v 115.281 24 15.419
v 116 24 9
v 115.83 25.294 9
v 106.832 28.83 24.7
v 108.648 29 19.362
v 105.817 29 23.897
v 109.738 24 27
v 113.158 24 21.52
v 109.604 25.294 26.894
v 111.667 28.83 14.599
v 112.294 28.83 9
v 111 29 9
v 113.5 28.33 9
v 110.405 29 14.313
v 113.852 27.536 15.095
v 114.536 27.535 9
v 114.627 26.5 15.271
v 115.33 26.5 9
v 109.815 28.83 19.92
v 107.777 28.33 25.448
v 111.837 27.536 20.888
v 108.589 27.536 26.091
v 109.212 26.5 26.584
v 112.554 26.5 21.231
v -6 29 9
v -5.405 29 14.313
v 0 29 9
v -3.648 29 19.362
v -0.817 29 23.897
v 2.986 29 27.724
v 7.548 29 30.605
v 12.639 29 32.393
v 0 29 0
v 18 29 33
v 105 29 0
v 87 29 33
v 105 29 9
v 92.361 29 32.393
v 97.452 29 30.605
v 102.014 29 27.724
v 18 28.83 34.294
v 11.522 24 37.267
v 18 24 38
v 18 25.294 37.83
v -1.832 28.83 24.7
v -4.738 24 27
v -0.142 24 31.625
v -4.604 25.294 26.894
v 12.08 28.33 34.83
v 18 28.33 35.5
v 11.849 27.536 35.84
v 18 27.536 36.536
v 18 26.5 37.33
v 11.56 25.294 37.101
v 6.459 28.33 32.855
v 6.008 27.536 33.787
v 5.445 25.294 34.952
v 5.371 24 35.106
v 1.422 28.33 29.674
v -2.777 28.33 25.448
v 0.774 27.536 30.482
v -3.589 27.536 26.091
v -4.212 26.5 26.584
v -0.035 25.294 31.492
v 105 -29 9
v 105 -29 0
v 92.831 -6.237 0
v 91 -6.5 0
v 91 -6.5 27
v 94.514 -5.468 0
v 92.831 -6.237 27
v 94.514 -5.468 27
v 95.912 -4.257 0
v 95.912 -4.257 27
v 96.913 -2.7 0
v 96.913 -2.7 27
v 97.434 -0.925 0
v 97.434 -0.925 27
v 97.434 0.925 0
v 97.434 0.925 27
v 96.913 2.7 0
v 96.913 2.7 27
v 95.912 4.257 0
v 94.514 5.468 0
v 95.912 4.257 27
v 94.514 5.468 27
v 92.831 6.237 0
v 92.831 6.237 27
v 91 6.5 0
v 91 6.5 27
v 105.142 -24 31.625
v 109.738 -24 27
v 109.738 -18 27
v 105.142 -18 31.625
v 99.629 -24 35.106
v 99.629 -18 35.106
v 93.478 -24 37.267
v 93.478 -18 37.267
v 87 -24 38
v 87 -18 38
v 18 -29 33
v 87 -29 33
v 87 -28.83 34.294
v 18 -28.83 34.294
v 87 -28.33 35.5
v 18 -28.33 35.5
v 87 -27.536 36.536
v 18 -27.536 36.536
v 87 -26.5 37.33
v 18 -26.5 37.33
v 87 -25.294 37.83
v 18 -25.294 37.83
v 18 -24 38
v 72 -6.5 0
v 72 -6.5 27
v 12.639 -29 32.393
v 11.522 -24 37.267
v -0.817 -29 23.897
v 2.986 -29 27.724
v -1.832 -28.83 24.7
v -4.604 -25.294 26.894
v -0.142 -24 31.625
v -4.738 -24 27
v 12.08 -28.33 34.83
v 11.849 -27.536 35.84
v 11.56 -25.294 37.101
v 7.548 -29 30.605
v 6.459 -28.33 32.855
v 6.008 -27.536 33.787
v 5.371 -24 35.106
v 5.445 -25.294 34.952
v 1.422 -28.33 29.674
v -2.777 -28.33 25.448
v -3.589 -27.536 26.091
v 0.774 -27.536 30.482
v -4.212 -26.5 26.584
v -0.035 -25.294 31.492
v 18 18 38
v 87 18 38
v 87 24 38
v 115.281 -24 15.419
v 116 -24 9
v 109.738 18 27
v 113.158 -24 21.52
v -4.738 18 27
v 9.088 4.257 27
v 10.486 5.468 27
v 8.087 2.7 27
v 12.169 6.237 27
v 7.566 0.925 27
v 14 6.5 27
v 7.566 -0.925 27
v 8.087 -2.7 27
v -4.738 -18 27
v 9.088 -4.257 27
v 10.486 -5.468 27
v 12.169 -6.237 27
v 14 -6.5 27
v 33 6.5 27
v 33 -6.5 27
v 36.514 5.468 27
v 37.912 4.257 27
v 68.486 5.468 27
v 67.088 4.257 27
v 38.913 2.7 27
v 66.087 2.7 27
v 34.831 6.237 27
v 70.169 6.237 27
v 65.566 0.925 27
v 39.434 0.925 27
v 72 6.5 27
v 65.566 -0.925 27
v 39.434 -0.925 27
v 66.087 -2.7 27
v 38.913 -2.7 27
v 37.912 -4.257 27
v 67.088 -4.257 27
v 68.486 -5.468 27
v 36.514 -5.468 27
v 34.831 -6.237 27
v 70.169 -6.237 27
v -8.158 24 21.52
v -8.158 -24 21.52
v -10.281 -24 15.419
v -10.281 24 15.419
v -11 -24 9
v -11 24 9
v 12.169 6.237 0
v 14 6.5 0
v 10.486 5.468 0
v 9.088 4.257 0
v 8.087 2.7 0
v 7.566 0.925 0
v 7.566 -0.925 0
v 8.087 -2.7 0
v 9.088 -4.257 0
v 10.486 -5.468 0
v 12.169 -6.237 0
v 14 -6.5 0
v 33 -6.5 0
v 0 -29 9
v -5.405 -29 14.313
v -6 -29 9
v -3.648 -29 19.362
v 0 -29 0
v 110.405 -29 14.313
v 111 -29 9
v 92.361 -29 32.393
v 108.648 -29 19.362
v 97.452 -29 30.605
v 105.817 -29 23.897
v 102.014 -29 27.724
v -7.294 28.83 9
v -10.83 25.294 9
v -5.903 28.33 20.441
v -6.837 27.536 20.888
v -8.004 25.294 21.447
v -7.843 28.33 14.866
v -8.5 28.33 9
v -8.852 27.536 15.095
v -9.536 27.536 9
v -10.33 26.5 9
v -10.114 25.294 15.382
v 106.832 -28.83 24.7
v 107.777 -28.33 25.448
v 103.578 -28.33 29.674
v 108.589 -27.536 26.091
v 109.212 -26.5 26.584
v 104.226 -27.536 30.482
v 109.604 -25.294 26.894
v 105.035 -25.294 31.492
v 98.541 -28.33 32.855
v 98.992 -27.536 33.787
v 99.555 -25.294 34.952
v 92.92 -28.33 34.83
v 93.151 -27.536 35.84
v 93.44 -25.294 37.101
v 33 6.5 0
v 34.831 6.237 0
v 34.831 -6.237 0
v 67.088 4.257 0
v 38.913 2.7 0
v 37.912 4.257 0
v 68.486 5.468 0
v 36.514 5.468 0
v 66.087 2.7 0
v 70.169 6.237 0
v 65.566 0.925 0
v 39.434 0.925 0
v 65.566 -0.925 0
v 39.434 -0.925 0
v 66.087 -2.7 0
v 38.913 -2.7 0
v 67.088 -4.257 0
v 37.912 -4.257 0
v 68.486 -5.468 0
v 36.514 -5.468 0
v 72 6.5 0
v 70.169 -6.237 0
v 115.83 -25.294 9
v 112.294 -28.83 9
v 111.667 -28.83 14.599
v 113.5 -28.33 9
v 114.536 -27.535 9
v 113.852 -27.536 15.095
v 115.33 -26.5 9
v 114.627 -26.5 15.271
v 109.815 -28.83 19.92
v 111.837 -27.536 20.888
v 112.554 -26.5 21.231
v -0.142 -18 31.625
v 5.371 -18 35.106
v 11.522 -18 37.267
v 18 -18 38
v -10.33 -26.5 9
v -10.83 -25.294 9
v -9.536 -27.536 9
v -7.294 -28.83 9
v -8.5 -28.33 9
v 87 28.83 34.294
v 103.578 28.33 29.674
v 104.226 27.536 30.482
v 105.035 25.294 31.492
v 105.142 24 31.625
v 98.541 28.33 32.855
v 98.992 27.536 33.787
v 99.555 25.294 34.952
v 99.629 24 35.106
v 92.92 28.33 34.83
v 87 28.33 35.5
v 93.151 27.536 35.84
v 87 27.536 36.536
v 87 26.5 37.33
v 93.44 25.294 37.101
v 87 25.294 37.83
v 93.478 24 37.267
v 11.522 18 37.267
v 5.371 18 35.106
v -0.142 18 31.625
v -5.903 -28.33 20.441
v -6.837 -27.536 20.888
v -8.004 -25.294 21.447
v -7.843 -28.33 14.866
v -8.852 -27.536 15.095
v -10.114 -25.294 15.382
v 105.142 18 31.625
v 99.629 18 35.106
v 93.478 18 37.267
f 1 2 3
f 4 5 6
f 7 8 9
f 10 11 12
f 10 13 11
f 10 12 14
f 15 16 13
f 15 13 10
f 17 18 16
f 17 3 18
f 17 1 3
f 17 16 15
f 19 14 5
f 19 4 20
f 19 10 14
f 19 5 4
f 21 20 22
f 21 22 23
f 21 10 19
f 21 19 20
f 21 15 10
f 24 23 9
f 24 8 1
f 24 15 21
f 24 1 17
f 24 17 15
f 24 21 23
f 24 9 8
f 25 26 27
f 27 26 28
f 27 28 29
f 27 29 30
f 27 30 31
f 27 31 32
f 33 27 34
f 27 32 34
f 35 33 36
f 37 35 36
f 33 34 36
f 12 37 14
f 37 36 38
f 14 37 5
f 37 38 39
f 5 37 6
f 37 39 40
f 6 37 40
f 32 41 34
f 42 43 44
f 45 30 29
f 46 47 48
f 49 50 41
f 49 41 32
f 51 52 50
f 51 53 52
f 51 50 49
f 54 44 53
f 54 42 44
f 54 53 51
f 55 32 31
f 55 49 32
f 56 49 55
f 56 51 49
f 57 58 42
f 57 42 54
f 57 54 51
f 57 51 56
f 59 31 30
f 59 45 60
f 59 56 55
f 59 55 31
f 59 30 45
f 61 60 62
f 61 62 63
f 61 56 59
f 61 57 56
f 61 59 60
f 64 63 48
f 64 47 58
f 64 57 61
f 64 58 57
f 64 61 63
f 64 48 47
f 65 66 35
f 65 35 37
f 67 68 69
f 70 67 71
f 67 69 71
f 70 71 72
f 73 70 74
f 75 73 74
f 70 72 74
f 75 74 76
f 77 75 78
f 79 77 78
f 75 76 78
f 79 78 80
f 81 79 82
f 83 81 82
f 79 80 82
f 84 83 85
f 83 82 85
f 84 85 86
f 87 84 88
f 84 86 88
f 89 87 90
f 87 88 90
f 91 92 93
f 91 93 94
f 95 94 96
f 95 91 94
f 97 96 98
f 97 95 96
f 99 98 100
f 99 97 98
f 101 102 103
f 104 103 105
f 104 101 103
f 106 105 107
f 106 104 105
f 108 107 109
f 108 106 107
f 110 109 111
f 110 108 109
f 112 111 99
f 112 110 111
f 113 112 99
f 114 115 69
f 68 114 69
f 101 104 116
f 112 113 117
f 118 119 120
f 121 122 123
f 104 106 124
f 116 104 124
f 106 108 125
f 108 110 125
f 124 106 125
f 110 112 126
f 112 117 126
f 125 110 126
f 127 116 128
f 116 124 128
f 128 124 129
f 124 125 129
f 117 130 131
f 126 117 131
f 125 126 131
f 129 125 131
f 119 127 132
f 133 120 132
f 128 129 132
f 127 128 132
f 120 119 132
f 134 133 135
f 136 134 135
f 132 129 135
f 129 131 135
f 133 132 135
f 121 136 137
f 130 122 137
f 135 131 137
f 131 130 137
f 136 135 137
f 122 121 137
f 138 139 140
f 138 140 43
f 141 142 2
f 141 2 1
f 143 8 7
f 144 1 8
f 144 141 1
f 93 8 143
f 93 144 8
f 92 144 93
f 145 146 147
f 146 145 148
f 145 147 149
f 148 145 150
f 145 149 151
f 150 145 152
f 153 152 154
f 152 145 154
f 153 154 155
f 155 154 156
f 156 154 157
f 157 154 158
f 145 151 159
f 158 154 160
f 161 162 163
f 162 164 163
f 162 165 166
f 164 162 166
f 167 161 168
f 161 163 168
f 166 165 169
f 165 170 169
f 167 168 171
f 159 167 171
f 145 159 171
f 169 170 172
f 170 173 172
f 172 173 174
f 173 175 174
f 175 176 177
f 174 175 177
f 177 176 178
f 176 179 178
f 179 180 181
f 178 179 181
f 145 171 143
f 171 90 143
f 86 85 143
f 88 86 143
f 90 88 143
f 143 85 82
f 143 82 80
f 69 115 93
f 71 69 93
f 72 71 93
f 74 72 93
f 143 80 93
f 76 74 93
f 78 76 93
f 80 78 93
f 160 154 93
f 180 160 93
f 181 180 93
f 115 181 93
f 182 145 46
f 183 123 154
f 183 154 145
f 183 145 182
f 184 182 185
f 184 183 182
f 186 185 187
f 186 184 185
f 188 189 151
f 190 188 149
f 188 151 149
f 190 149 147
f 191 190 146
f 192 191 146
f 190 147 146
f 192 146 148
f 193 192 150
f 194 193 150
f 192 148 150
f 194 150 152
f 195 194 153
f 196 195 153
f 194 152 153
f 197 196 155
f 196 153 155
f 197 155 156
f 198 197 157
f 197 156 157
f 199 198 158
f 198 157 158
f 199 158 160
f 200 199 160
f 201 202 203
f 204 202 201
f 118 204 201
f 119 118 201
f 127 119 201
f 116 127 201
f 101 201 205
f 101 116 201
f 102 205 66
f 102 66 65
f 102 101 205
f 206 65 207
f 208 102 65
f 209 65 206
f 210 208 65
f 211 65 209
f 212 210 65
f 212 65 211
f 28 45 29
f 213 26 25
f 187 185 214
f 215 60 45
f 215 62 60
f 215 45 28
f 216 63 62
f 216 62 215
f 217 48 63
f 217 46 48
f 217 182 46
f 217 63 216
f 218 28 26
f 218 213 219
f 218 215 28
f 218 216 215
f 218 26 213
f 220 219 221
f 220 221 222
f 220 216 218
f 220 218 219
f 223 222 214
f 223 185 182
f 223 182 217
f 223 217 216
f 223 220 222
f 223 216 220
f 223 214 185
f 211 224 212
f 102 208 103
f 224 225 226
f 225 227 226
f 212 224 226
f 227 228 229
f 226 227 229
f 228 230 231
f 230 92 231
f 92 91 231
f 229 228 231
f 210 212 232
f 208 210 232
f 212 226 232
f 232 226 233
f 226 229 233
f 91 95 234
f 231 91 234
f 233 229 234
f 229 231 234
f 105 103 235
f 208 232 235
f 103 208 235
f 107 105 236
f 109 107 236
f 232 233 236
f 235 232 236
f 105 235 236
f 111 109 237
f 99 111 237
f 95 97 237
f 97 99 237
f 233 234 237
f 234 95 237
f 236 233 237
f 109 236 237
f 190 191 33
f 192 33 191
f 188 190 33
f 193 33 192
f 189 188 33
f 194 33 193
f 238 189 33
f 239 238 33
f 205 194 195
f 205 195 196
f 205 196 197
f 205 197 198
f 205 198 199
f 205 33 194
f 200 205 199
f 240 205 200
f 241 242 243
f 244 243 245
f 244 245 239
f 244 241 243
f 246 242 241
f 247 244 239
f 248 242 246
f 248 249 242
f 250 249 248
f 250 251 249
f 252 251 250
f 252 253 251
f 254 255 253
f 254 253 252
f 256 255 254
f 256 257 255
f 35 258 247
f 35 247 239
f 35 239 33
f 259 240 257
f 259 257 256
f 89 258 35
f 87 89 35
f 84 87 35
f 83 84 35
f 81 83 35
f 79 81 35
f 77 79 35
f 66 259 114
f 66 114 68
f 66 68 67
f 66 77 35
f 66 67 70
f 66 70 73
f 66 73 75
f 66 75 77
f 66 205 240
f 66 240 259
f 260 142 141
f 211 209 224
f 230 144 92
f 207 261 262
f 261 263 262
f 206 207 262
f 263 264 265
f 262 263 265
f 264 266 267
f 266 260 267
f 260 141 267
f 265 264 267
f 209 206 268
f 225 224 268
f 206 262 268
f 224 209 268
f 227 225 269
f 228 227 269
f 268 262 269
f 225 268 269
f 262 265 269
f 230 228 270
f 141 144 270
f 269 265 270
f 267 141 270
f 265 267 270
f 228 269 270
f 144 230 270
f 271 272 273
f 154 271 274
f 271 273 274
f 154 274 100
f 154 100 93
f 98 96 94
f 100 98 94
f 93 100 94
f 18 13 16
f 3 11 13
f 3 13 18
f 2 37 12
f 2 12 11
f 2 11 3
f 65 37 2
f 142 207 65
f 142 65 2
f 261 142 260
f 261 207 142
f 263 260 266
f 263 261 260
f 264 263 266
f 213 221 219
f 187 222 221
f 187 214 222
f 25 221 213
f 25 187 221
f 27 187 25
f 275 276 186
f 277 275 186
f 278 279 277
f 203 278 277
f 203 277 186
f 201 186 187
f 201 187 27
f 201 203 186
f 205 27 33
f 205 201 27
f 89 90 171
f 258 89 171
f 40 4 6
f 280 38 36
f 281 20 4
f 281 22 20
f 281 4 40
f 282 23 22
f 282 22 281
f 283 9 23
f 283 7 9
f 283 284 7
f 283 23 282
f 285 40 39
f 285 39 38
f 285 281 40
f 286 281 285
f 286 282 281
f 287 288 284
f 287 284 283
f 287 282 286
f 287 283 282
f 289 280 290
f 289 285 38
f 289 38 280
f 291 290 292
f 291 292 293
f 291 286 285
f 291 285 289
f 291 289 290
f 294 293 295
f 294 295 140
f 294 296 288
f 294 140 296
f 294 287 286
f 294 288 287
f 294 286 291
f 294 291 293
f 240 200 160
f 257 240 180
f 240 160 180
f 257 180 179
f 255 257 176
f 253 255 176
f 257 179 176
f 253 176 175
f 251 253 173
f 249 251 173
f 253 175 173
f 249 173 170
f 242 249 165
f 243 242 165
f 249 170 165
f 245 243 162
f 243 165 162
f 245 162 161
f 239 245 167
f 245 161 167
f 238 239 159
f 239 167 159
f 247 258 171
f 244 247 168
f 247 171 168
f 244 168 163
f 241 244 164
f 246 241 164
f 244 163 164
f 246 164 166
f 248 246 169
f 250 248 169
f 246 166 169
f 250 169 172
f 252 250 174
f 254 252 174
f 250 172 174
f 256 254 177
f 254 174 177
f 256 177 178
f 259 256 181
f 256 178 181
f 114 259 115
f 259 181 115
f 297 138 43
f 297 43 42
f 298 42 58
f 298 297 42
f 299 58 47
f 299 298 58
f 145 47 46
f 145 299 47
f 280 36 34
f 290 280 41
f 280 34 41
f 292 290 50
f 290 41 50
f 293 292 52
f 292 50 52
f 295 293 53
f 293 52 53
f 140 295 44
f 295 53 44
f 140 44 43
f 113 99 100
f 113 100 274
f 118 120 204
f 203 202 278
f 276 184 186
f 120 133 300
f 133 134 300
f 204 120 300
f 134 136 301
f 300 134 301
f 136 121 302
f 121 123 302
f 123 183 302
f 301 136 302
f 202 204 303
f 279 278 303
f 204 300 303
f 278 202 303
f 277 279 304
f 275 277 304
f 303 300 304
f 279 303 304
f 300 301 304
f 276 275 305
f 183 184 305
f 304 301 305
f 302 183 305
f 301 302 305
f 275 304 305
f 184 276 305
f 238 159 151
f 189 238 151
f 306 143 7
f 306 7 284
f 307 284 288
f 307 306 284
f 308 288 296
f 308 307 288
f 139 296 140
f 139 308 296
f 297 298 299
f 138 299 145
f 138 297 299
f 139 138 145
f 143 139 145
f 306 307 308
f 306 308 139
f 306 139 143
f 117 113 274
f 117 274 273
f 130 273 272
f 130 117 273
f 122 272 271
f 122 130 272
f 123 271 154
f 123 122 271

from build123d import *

# Parameters (mm, degrees)
F1_DEPTH = 29
F2_DEPTH = 18
F4_DEPTH = 27.001
F5_R     = 5


with BuildPart() as f1:
    # F0 (on Front) → F1 (new body, symmetric)
    with BuildSketch(Plane.XZ):
        with BuildLine():
            Line((0, 9), (0, 0))
            Line((0, 0), (105, 0))
            Line((105, 0), (105, 9))
            Line((105, 9), (116, 9))
            ThreePointArc((116, 9), (114.3897, 18.529129), (109.737634, 27))
            Line((109.737634, 27), (-4.737634, 27))
            ThreePointArc((-4.737634, 27), (-9.3897, 18.529129), (-11, 9))
            Line((-11, 9), (0, 9))
        make_face()
        with BuildLine():
            ThreePointArc((18, 38), (5.370669, 35.105555), (-4.737634, 27))
            Line((-4.737634, 27), (109.737634, 27))
            ThreePointArc((109.737634, 27), (99.629331, 35.105555), (87, 38))
            Line((87, 38), (18, 38))
        make_face()
    extrude(amount=F1_DEPTH, both=True)

    # F0 (on Front) → F2 (cut, symmetric)
    with BuildSketch(Plane.XZ):
        with BuildLine():
            ThreePointArc((18, 38), (5.370669, 35.105555), (-4.737634, 27))
            Line((-4.737634, 27), (109.737634, 27))
            ThreePointArc((109.737634, 27), (99.629331, 35.105555), (87, 38))
            Line((87, 38), (18, 38))
        make_face()
    extrude(amount=F2_DEPTH, both=True, mode=Mode.SUBTRACT)

    # F3 (on face) → F4 (cut, through all)
    with BuildSketch(Plane.XY.offset(27)):
        with BuildLine():
            ThreePointArc((14, 6.5), (7.5, 0), (14, -6.5))
            Line((14, -6.5), (33, -6.5))
            ThreePointArc((33, -6.5), (39.5, 0), (33, 6.5))
            Line((33, 6.5), (14, 6.5))
        make_face()
        with BuildLine():
            ThreePointArc((72, 6.5), (65.5, 0), (72, -6.5))
            Line((72, -6.5), (91, -6.5))
            ThreePointArc((91, -6.5), (97.5, 0), (91, 6.5))
            Line((91, 6.5), (72, 6.5))
        make_face()
    extrude(amount=-F4_DEPTH, mode=Mode.SUBTRACT)

    # F5
    f5_edges = [f1.edges().sort_by_distance(p)[0] for p in [
        (107.506097, -29, 29.506097),
        (107.506097, 29, 29.506097),
    ]]
    fillet(f5_edges, radius=F5_R)


solid = f1.part
